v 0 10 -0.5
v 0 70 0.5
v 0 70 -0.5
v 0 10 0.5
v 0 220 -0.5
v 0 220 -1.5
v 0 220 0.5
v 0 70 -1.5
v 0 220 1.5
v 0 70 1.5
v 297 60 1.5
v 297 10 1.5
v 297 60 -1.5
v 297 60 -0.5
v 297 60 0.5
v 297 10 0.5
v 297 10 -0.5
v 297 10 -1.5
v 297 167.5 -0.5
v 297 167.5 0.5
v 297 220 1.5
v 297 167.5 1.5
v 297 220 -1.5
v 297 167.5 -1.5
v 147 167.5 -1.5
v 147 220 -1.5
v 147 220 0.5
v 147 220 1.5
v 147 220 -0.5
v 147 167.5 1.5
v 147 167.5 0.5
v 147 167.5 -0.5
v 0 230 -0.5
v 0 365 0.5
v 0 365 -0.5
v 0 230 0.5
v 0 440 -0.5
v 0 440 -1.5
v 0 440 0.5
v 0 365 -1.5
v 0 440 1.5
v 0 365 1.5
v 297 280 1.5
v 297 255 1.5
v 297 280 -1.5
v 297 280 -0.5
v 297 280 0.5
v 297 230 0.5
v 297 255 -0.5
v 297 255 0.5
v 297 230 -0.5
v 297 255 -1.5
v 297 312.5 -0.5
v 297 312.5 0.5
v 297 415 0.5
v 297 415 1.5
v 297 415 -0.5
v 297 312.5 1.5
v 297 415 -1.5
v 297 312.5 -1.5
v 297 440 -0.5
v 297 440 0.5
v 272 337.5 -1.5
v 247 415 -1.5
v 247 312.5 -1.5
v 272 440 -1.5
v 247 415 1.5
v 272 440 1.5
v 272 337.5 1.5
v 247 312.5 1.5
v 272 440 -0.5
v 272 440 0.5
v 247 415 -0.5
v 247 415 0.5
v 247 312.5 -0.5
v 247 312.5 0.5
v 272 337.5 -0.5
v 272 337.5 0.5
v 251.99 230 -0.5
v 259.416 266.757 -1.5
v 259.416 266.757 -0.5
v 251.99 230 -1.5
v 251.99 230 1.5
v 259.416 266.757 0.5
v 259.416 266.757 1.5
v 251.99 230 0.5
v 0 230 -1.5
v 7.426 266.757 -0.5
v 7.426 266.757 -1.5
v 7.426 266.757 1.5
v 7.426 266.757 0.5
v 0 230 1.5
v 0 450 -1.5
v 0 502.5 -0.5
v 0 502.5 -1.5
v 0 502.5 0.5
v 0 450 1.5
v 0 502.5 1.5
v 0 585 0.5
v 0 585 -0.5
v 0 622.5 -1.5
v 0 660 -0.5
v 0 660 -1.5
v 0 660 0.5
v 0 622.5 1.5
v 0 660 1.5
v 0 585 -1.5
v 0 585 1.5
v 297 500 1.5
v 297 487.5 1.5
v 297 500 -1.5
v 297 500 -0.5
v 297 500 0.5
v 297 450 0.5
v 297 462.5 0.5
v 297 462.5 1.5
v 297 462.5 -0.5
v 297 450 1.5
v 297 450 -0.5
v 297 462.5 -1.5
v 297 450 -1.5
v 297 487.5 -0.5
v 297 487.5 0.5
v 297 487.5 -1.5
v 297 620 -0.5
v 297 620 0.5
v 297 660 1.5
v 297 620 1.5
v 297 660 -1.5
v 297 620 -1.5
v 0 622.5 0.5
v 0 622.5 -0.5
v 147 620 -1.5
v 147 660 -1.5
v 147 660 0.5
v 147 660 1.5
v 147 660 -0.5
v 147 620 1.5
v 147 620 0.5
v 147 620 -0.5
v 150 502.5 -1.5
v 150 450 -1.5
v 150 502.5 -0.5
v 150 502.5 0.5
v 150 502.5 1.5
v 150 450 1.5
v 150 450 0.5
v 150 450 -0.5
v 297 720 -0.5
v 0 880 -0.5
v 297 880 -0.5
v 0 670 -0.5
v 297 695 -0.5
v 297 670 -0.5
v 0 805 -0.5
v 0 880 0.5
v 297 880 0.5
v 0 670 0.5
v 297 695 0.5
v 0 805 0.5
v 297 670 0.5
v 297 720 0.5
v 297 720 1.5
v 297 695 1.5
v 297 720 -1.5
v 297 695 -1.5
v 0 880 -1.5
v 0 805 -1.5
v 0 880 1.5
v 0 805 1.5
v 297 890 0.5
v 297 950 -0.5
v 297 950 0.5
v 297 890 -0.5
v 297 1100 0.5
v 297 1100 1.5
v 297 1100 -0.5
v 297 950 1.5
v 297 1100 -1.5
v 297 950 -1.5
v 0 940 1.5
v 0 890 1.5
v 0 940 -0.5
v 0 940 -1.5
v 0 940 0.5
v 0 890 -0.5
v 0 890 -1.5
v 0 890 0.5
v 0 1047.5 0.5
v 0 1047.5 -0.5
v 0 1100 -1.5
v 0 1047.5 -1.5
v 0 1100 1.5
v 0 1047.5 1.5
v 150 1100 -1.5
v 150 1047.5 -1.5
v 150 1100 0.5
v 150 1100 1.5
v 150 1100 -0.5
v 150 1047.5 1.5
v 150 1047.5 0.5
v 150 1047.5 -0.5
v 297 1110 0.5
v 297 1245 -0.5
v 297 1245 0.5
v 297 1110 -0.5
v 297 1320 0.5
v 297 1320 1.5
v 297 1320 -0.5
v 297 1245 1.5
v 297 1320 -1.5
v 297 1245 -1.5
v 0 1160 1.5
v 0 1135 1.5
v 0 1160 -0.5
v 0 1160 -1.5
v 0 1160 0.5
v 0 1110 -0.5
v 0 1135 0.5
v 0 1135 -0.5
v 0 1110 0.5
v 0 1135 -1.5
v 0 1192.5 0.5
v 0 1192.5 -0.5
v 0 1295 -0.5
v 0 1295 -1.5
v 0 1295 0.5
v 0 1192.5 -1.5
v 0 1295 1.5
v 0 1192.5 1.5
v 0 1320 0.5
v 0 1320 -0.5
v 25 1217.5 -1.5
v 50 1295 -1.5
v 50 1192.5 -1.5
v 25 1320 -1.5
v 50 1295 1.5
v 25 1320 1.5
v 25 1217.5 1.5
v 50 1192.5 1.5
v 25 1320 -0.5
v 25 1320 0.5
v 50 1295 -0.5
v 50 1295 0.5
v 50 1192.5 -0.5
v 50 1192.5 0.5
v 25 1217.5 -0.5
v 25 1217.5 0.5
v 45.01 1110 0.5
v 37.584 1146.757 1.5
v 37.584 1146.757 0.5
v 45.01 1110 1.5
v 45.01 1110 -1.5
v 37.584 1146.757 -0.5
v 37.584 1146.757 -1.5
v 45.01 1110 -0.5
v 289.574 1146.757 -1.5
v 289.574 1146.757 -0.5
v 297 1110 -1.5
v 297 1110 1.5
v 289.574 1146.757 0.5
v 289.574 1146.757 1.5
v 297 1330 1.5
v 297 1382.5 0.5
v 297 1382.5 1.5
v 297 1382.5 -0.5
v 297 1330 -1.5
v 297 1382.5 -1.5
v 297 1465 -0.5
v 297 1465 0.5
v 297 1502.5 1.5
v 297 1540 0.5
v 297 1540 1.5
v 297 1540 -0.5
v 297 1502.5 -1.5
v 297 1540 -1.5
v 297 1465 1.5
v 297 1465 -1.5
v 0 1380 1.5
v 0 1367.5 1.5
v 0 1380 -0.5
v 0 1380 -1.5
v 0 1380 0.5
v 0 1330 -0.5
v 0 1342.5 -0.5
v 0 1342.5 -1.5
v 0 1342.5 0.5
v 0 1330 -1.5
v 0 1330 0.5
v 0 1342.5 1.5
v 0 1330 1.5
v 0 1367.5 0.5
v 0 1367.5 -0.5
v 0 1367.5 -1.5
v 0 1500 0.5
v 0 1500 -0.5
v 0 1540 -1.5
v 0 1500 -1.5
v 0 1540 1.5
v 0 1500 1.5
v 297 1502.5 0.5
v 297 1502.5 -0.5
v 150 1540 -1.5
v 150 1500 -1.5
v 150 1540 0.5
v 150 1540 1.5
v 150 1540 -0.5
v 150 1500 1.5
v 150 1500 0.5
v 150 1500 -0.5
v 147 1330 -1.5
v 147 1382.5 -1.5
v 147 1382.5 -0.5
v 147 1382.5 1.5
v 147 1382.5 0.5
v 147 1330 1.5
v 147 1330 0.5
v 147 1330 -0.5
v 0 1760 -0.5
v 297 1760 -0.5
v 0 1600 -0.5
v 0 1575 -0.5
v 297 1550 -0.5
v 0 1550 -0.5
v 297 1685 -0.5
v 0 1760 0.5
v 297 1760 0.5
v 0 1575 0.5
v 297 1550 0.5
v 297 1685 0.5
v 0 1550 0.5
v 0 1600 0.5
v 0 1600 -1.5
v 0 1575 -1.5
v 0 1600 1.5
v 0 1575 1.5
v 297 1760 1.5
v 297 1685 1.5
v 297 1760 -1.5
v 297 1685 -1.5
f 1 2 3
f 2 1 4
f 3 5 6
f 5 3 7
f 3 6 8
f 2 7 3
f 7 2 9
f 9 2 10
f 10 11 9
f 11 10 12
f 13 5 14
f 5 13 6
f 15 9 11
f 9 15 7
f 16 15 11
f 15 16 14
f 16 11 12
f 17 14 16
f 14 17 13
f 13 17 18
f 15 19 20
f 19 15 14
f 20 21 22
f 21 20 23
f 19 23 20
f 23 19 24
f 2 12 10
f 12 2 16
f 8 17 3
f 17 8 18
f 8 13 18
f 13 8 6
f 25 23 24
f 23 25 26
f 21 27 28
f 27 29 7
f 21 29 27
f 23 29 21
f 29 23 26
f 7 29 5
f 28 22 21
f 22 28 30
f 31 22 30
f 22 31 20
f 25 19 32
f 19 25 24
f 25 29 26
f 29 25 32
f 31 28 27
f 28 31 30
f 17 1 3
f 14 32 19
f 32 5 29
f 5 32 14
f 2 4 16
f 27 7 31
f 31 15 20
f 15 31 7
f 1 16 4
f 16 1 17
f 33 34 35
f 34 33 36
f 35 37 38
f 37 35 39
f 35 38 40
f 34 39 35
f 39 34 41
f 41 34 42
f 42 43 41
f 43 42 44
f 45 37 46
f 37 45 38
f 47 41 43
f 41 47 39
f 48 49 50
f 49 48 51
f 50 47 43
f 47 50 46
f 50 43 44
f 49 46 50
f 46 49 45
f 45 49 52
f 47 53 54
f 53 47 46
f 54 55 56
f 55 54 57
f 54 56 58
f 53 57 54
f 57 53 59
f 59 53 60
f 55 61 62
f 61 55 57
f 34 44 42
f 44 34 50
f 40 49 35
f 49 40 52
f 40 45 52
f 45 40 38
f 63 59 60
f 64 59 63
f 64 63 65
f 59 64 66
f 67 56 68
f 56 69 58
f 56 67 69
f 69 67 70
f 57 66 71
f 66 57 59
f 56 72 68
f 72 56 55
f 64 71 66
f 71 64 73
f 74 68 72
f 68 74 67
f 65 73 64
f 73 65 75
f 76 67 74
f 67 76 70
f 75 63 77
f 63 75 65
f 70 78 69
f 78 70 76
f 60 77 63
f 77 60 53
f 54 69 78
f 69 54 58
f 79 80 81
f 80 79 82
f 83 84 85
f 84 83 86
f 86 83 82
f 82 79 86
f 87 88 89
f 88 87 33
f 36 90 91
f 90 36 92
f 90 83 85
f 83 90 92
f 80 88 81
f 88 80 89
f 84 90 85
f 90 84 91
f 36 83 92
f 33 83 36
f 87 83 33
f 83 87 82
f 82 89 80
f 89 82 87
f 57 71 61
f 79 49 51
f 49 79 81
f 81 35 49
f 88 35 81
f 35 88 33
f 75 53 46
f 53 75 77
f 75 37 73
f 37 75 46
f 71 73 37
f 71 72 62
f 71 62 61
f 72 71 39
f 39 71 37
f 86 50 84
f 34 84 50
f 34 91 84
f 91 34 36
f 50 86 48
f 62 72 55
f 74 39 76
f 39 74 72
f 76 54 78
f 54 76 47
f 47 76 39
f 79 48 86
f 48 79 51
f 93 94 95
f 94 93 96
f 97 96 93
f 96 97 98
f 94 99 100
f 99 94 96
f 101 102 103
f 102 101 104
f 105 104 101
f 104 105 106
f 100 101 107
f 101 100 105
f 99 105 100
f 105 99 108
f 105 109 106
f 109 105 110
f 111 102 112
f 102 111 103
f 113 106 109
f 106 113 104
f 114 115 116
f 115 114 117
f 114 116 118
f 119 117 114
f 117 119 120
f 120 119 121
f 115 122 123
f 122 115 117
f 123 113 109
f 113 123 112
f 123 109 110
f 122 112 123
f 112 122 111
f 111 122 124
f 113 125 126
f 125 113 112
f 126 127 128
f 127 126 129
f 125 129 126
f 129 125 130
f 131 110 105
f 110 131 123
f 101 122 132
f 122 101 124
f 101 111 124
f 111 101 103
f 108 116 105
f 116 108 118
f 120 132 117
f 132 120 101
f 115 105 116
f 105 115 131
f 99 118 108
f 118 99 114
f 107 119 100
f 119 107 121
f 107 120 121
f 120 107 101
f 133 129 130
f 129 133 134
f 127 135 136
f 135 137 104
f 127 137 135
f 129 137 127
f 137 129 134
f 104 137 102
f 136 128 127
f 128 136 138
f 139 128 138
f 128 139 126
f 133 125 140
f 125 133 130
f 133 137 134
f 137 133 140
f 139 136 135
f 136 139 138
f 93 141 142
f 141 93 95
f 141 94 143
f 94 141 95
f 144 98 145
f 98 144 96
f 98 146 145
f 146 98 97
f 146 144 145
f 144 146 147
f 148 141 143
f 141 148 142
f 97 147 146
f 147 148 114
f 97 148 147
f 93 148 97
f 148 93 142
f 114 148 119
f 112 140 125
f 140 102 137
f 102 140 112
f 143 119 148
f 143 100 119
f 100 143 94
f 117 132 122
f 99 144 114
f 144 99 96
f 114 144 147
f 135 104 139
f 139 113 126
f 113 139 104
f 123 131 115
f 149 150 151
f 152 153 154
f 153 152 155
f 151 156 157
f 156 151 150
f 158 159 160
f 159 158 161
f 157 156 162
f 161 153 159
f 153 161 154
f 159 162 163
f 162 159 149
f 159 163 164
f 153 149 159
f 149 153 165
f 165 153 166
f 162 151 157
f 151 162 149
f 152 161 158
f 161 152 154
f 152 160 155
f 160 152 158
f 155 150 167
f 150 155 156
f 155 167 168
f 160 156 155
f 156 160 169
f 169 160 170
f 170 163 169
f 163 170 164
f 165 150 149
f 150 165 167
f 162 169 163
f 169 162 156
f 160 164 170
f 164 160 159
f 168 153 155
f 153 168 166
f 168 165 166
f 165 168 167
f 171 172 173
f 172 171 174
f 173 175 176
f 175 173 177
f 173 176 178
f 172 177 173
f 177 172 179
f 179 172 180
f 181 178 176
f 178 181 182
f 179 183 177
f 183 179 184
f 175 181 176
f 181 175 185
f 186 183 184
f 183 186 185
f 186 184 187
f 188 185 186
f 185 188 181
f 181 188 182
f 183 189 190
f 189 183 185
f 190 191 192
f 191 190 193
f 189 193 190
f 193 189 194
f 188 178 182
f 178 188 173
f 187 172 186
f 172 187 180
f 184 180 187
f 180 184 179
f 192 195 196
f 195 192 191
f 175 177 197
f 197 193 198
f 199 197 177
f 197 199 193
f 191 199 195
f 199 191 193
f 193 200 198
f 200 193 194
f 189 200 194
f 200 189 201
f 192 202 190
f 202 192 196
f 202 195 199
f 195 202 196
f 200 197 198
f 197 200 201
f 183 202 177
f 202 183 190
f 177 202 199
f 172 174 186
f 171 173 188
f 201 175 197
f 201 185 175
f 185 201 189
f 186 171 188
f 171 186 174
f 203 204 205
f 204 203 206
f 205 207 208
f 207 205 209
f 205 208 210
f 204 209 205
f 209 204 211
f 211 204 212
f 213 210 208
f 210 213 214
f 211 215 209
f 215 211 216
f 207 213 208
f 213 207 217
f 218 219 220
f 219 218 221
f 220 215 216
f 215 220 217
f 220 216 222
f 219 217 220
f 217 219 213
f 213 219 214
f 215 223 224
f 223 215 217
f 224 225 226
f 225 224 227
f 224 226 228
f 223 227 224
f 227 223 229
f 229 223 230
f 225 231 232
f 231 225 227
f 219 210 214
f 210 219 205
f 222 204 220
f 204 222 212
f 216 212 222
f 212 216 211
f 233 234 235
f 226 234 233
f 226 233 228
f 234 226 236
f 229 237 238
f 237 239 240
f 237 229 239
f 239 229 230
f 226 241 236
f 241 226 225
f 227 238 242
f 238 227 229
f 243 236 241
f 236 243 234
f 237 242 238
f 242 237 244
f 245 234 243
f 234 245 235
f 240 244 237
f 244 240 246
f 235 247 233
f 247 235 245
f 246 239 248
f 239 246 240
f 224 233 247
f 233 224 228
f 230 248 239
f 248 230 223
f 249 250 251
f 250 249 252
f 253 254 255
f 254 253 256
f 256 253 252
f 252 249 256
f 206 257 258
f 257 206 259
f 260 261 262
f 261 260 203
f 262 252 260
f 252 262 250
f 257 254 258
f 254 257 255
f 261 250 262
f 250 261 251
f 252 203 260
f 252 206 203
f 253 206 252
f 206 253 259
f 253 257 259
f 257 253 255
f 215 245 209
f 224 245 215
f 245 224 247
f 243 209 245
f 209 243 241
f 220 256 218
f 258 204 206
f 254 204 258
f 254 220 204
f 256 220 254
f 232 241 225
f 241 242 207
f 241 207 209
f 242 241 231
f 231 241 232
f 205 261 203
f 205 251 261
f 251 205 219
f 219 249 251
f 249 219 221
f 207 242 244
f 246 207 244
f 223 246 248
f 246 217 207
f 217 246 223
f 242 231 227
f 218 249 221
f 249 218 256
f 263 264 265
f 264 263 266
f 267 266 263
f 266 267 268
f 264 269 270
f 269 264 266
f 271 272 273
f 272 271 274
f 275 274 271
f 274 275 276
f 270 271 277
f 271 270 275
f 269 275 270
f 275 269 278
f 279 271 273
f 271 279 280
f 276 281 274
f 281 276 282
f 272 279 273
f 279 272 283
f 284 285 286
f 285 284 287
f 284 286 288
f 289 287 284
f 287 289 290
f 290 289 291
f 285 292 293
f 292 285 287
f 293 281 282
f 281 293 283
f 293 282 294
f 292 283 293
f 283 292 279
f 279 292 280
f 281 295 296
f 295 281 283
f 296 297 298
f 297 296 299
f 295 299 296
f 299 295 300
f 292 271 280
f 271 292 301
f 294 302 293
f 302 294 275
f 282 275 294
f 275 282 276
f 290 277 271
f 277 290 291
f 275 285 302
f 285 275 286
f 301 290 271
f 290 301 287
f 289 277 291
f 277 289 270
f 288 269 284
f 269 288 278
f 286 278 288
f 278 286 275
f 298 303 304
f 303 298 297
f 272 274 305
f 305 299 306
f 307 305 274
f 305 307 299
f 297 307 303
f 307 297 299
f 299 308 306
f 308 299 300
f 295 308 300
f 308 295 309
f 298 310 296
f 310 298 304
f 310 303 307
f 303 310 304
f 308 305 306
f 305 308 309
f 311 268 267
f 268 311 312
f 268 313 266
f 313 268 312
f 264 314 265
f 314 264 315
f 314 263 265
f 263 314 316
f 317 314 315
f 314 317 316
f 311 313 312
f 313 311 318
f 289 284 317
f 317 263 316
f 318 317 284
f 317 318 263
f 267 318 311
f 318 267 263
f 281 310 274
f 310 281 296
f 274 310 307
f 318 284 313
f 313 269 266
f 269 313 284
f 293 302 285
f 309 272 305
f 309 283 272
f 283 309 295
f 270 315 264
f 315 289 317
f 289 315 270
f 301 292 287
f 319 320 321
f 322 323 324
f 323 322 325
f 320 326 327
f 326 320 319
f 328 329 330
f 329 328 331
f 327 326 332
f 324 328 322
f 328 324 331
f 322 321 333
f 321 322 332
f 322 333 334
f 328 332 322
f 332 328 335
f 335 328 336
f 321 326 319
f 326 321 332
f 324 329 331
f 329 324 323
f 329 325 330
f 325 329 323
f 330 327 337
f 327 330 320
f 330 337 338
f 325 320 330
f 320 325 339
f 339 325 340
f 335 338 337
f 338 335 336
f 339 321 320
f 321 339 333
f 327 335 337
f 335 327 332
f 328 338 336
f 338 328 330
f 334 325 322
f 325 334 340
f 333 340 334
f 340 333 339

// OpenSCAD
// http://fwcg.3dzone.dk/
// https://www.flitetest.com/articles/kfm-6-flying-wing


// Printed parts 71.75 g single shell, 5% infill
// Foam 123g = 41g per sheet assume 3 sheets (maybe less than 2)
// ESC 40g  https://www.unmannedtechshop.co.uk/product/dys-20a-2-4s-brushless-esc-with-5v-2a-bec-for-rc-fixed-wing-aircraft/
// Motor 32g https://www.unmannedtechshop.co.uk/product/emax-eco-ii-series-2207-motor/
// Battery 70g
// Props https://www.unmannedtechshop.co.uk/product/hqprop-t5-1x2-5x3-grey-propeller-2cw2ccw/
// 312g 
// Add for camera
//  camera VTX  https://www.aliexpress.com/item/1005008234258917.html?spm=a2g0o.cart.0.0.5ac538dalBiVNT&mp=1 and generic Camera 
// Add for flight controller (5.6g) https://www.hobbyrc.co.uk/speedybee-f405-wing-mini-flight-controller
// GPS https://www.unmannedtechshop.co.uk/product/tbs-m10-gps-glonass-module/
// Add for servos


// Used 350g for calcs


// Costs 
// Printed parts: £1.72
// Foam sheets:  £6.99 for 10 sheets
// ESC: £8.49
// Motor: £12.99
// Battery: £14.50
// Props: £2.37
// Camera: 
// Flight Controller: £29.80
// Postage £5.00
// Micro Servo: £1.00
// GPS £14.90
// Wiring and other consumables
// £121.63 1.72+6.99+8.49+12.99+14.50+2.35+13.99+2.80+6.10+29.80+6.00+1.0+14.90


display = 3;
display_page = 7;
display_part = "cockpit"; //"cockpit" "cockpit_front"  "leading_edge_half")

module display(display=display)
{
    if(display==1)
    {
        display_model(foam=true, printed_part=true);
    }
    if(display==2)
    {
        print_all();
    }
    if(display==3)
    {
        print_foam_all(outline=true);
    }
    if(display==4)
    {
        projection() print_foam_all(outline=false);
    }
    if(display==5)
    {
        projection() print_foam(page=display_page, outline=false);
    }
    if (display==6)
    {
         print_single(display_part);
    }
}

display();



// The OpenSCAD Variables

$fn=60;


a4_h = 297;
a4_w = 210;
foam_height = 3;

wing_span = a4_h*2;
root_cord = 150;
tip_cord = 50;

aileron_offset = 50;
aileron_offset_w = 37.5;

// Make the top of bottom of cockpit eqaul 1/2 width of a4 - easier to square-up
cockpit_x = a4_w/2+foam_height*2;
cockpit_y = root_cord;
cockpit_z = 40;
cockpit_thickness = foam_height;
cockpit_window_diameter = 15;

cockpit_motor_spacing = 12;
cockpit_motor_spacing_hole = 3;


sweep_d = atan((a4_w-tip_cord)/(a4_h));
aileron_d = atan ( (a4_w - root_cord) /  a4_h); 

hinge = 2.5;
aileron_y = tan(aileron_d) * aileron_offset + hinge; 


echo("wing_span: ", wing_span);
echo("wing_span inc body: ", wing_span+cockpit_x);
echo("Sweep degrees: ", sweep_d);


// The OpenSCAD modules 

module A4()
{
    square(size = [a4_w, a4_h], center = false);
}

module profile_leading_edge()
{
    difference()
    {
        rotate([0,90,0]) cylinder(h=0.1, r = foam_height*2.5, center = true);
       translate([0,-foam_height*5/2,0]) cube(foam_height*5, center=true);
    }
}

module leading_edge()
{
    color("green") hull()
    {
        translate([0.1,0,0])  profile_leading_edge();
        translate([wing_span/2-0.1,-(a4_w-tip_cord),0]) profile_leading_edge();
    }
}



module wing_part(cord_percentage = 1)
{
    point_1_y = tan(sweep_d) * wing_span/2;
    linear_extrude(foam_height, center = true) polygon(points=[[0,0],[wing_span/2,-point_1_y], [wing_span/2,-point_1_y], [wing_span/2,-point_1_y-tip_cord*cord_percentage], [0,-root_cord*cord_percentage]]);
}

module aileron_part()
{
    translate([0,0,0 ]) linear_extrude(foam_height, center = true) polygon(points=[
            [aileron_offset,0],
            [a4_h, -tan(aileron_d) * (a4_h-aileron_offset)],
            [a4_h, -tan(aileron_d) * (a4_h-aileron_offset) -aileron_offset_w],
            [aileron_offset, -aileron_offset_w],
    ]);
}

module wing_tip()
{
    // https://www.rcgroups.com/forums/showpost.php?p=17964790&postcount=8
    tip_length = tip_cord *.5;
    tip_height = tip_cord *.5;
    translate([0,0,0 ]) linear_extrude(foam_height, center = true) polygon(points=[
            [0,0],
            [tip_height,-tip_height],
            [tip_height,-tip_height-tip_cord-aileron_offset-hinge],
            // center
            [0,-0-tip_cord-aileron_offset-hinge],
            // Mirror
            [-tip_height,-tip_height-tip_cord-aileron_offset-hinge],
            [-tip_height,-tip_height],
    ]);
}

module half_KMF6_foam()
{
    {
        translate([0,0,foam_height* 0])   wing_part(cord_percentage = 1);
        translate([0,0,foam_height* 1])   wing_part(cord_percentage = 0.5);
        translate([0,0,foam_height* 2])   wing_part(cord_percentage = 0.25);
        translate([0,0,foam_height*-1])   wing_part(cord_percentage = 0.5);
        translate([0,0,foam_height*-2])   wing_part(cord_percentage = 0.25);
    }
}

module cockpit_front(offset_t=0)
{
    front_r = foam_height*2.5;
    extent_y = (sin(sweep_d) * cockpit_x/2) + foam_height*5 - front_r;
    hull()
    {
        translate([cockpit_x/2-offset_t,0,0]) profile_leading_edge();
        translate([-cockpit_x/2+offset_t,0,0]) profile_leading_edge();
        translate([0,extent_y-offset_t,0]) rotate([0,0,0]) rotate([90,0,0]) cylinder(h=0.1,r=front_r, center=true);
*        cube([cockpit_x/2-offset_t, 0.1, cockpit_z-offset_t], center = true);
        translate([0,-offset_t,0]) cube([cockpit_x-offset_t, 0.1, cockpit_z-offset_t], center = true);
    }
}

module cockpit_front_shell()
{
    color("green") difference()
    {
        cockpit_front();
        cockpit_front(offset_t=cockpit_thickness*2);
        rotate([90,0,0]) cylinder(h=cockpit_y*2, r=cockpit_window_diameter/2, center=true);
    }  
}

module cockpit_foam_top()
{
    translate([0,0,0 ]) 
        linear_extrude(foam_height, center = true) polygon(points=[
            [-cockpit_x/2+foam_height,0],
            [cockpit_x/2-foam_height,0],
            [cockpit_x/2-foam_height,-cockpit_y],
            [-cockpit_x/2+foam_height,-cockpit_y],
    ]);
    
}

module cockpit_foam_side()
{
    translate([0,0,0 ]) 
        linear_extrude(foam_height, center = true) polygon(points=[
            [-cockpit_z/2,0],
            [cockpit_z/2,0],
            [cockpit_z/2,-cockpit_y],
            [-cockpit_z/2,-cockpit_y],
    ]);
    
}

module cockpit_foam()
{
    translate([0,0,cockpit_z/2-foam_height/2]) cockpit_foam_top();
    translate([0,0,-cockpit_z/2+foam_height/2]) cockpit_foam_top();
    translate([-cockpit_x/2+foam_height/2,0,0]) rotate([ 0,90, 0]) cockpit_foam_side();
    translate([cockpit_x/2-foam_height/2,0,0]) rotate([ 0,90, 0]) cockpit_foam_side();    
}

module motor_and_prop()
{
    color("silver") 
    {
        cube([cockpit_motor_spacing+foam_height, foam_height, cockpit_motor_spacing+foam_height], center = true);
        translate([0,-33.2/2,0]) rotate([90,0,0]) cylinder(h=33.2,r=5/2, center=true);
        translate([0,-8/2,0]) rotate([90,0,0]) cylinder(h=13,r=27.5/2, center=false);
    }
    color("red") translate([0,-33.2+6,0]) rotate([0,30,0]) cube([129.5,10,15], center=true);
}

module chamfer()
{
    difference()
    {
        cube(foam_height, center=true);
        translate([0,foam_height/2,foam_height/2]) rotate([0,90,0]) cylinder(h=foam_height*4,r=foam_height, center=true);
    }
}

module cockpit()
{
    color("green") translate([0,-cockpit_y/2,0]) 
    {   
        difference()
        {
            union()
            {
                cube([cockpit_x-foam_height*2,cockpit_y, cockpit_z-foam_height*2], center=true);
            }
                cube([cockpit_x,cockpit_y-foam_height*2, cockpit_z-foam_height*4], center=true);            
                cube([cockpit_x-foam_height*4,cockpit_y-foam_height*2, cockpit_z+foam_height*2], center=true);            
                translate([0,0,foam_height*1.5]) cube([cockpit_x,cockpit_y-foam_height*2, cockpit_z-foam_height*2], center=true);            
                translate([0,foam_height/2+foam_height*2,foam_height*1.5]) cube([cockpit_x-foam_height*4,cockpit_y-foam_height*2, cockpit_z-foam_height*1], center=true);            
            //cockpit_motor_spacing
            translate([cockpit_motor_spacing/2, 0, cockpit_motor_spacing/2] )
                rotate([90,0,0])
                    cylinder(h=cockpit_y*2,r=cockpit_motor_spacing_hole/2, center=true);
            translate([cockpit_motor_spacing/2, 0, -cockpit_motor_spacing/2] )
                rotate([90,0,0])
                    cylinder(h=cockpit_y*2,r=cockpit_motor_spacing_hole/2, center=true);
            translate([-cockpit_motor_spacing/2, 0, cockpit_motor_spacing/2] )
                rotate([90,0,0])
                    cylinder(h=cockpit_y*2,r=cockpit_motor_spacing_hole/2, center=true);
            translate([-cockpit_motor_spacing/2, 0, -cockpit_motor_spacing/2] )
                rotate([90,0,0])
                    cylinder(h=cockpit_y*2,r=cockpit_motor_spacing_hole/2, center=true);
        }
        // Champher on uprights
        translate([cockpit_x/2-foam_height*1.5,cockpit_y/2-foam_height*1.5,-cockpit_z/2+foam_height*2.5]) rotate([0,0,180]) chamfer();
        translate([-cockpit_x/2+foam_height*1.5,cockpit_y/2-foam_height*1.5,-cockpit_z/2+foam_height*2.5]) rotate([0,0,180]) chamfer();
        translate([cockpit_x/2-foam_height*1.5,-cockpit_y/2+foam_height*1.5,-cockpit_z/2+foam_height*2.5]) rotate([0,0,  0]) chamfer();
        translate([-cockpit_x/2+foam_height*1.5,-cockpit_y/2+foam_height*1.5,-cockpit_z/2+foam_height*2.5]) rotate([0,0,  0]) chamfer();
        translate([cockpit_x/2-foam_height*2.5-foam_height*4,cockpit_y/2-foam_height*0.5,-cockpit_z/2+foam_height*2.5]) rotate([0,0,90]) chamfer();
        translate([-cockpit_x/2+foam_height*2.5+foam_height*4,cockpit_y/2-foam_height*0.5,-cockpit_z/2+foam_height*2.5]) rotate([0,0,270]) chamfer();

           // Better strength at top
        translate([-cockpit_x/2+foam_height+foam_height*5/2, cockpit_y/2-foam_height/2, 0]) cube([foam_height*5, foam_height, cockpit_z-foam_height*2], center=true);
        translate([+cockpit_x/2-foam_height-foam_height*5/2, cockpit_y/2-foam_height/2, 0]) cube([foam_height*5, foam_height, cockpit_z-foam_height*2], center=true);    
    
           // Better strength at bottom
        translate([0,0,-cockpit_z/2+foam_height*3/2]) intersection()
        {
            cube([cockpit_x-foam_height*2,cockpit_y, foam_height], center=true);
            union()
            {
                number_extra = 3;
                space = cockpit_x/number_extra;
                for(i = [0:5])
                {
                    rotate([0,0,45]) translate([-cockpit_x/2+space*i,0]) cube([foam_height,cockpit_y*2,foam_height], center=true);
                    rotate([0,0,-45]) translate([-cockpit_x/2+space*i,0]) cube([foam_height,cockpit_y*2,foam_height], center=true);
                }
            }
        }
    
    }    
}

module print_leading_edge()
{
    lead_edge_l = sqrt((wing_span/2)*(wing_span/2) + root_cord*root_cord);
    translate([0,0,0])  difference()
    {
        translate([-lead_edge_l/2,0,0]) rotate([0,0,0]) rotate([90,0,0]) rotate([0,0,sweep_d]) leading_edge();
        rotate([0,-sweep_d,0]) translate([-lead_edge_l,-lead_edge_l/2,0]) cube(lead_edge_l, center=false);
    }
}

module print_cockpit()
{
    cockpit();
}

module print_cockpit_front_shell()
{
    rotate([0,0,90]) rotate([90,0,0]) cockpit_front_shell();
}

module print_all()  
{
    translate([-cockpit_x/2-foam_height*2,0,0]) rotate([0,0,270]) print_leading_edge();
    translate([-cockpit_x/2-foam_height*8,0,0]) rotate([0,0,270]) print_leading_edge();
    translate([-cockpit_x/2-foam_height*14,0,0]) rotate([0,0,270]) print_leading_edge();
    translate([-cockpit_x+foam_height*4,+foam_height*4,0]) rotate([0,0,0]) print_leading_edge();
    translate([foam_height*0.25,0,cockpit_z/2-foam_height]) print_cockpit();
    translate([cockpit_x/2+cockpit_z/2,-cockpit_y/2,0])   print_cockpit_front_shell();    
}

module print_single(part)
{
    if(part=="cockpit")
        print_cockpit();
    if(part=="cockpit_front")
        print_cockpit_front_shell();
    if(part=="leading_edge_half")
        print_leading_edge();
}


module print_foam_all(pages=8, outline=true)
{
    for (i = [1 : pages])
    {
        translate([ 0, (a4_w+10)*i, 0 ]) print_foam(page=i, outline=outline);
    }
}

module a4_mirror_and_reposition()
{
    translate([a4_h,0,0]) mirror([1,0,0])  children();
}

module print_foam(page=2, outline=true)
{
    if(outline)
    {
        color("black") rotate([0,0,-90]) linear_extrude(1, center = true) A4();
    }
    if(page==1)
    {
        translate([0,0,0])   wing_part(cord_percentage = 1);
        translate([a4_h-cockpit_y,(-cockpit_x/2+foam_height)/2,0]) rotate([0,0,90]) scale([0.5,1,1])  cockpit_foam_top();
    }
    if(page==2)
    {
        translate([0,0,0])    wing_part(cord_percentage = 0.5);
        translate([a4_h-tip_cord*.5,0,0]) wing_tip();
       translate([0,-a4_w,0]) mirror([0,1,0]) rotate([0,0,aileron_d]) translate([-aileron_offset,0,0]) aileron_part();
    }
    if(page==3)
    {
        translate([0,0,0])    wing_part(cord_percentage = 0.25);
        translate([0,-root_cord*0.25,0])    wing_part(cord_percentage = 0.25);
        translate([a4_w-cockpit_y/2+foam_height*4,-cockpit_z/2,0]) rotate([0,0,90]) cockpit_foam_side();
        translate([0,-a4_w-(-cockpit_x/2+foam_height)/2,0]) rotate([0,0,90]) scale([0.5,1,1])  cockpit_foam_top();
    }
    if(page==4)
    {
        wing_part(cord_percentage = 0.5);
    }
    
    if(page==5)
    {
        a4_mirror_and_reposition() print_foam(page=1, outline=outline);
    }
    if(page==6)
    {
        a4_mirror_and_reposition() print_foam(page=2, outline=outline);
    }
    if(page==7)
    {
        a4_mirror_and_reposition() print_foam(page=3, outline=outline);
    }
    if(page==8)
    {
        a4_mirror_and_reposition()  print_foam(page=4, outline=outline);
    }
    
    /*
    translate_away_from_cockpit(mirror=true)
    {
        half_KMF6_foam();
        translate([0,-root_cord-aileron_y,0]) aileron_part();
        translate([wing_span/2+foam_height/2,-root_cord,0]) rotate([0,90,0]) wing_tip();
    }
    cockpit_foam();
    */    
}


module translate_away_from_cockpit(mirror=false)
{
    if(mirror)
    {
        mirror([1,0,0]) translate([cockpit_x/2,0,0]) children();
    }
    else
    {
        translate([cockpit_x/2,0,0])  children();
    }
    
}

module display_printed_parts()
{
    cockpit();
    cockpit_front_shell();
    translate_away_from_cockpit(mirror=false) 
    {
        leading_edge();
    }
    translate_away_from_cockpit(mirror=true) 
    {
        leading_edge();
    }
    
}



module display_foam()
{
    translate_away_from_cockpit(mirror=false) 
    {
        half_KMF6_foam();
        translate([-foam_height,-root_cord-aileron_y,0]) aileron_part();
        translate([wing_span/2+foam_height/2,-root_cord,0]) rotate([0,90,0]) wing_tip();
    }
    translate_away_from_cockpit(mirror=true)
    {
        half_KMF6_foam();
        translate([0,-root_cord-aileron_y,0]) aileron_part();
        translate([wing_span/2+foam_height/2,-root_cord,0]) rotate([0,90,0]) wing_tip();
    }
    cockpit_foam();
        
}

module display_model(printed_part=true, foam=true)
{
    if(printed_part)
    {
        display_printed_parts();
    }
    if(foam)
    {
        display_foam();
    }
    if(printed_part && foam)
    {
            translate([0,-cockpit_y,0]) motor_and_prop();
    }
}
